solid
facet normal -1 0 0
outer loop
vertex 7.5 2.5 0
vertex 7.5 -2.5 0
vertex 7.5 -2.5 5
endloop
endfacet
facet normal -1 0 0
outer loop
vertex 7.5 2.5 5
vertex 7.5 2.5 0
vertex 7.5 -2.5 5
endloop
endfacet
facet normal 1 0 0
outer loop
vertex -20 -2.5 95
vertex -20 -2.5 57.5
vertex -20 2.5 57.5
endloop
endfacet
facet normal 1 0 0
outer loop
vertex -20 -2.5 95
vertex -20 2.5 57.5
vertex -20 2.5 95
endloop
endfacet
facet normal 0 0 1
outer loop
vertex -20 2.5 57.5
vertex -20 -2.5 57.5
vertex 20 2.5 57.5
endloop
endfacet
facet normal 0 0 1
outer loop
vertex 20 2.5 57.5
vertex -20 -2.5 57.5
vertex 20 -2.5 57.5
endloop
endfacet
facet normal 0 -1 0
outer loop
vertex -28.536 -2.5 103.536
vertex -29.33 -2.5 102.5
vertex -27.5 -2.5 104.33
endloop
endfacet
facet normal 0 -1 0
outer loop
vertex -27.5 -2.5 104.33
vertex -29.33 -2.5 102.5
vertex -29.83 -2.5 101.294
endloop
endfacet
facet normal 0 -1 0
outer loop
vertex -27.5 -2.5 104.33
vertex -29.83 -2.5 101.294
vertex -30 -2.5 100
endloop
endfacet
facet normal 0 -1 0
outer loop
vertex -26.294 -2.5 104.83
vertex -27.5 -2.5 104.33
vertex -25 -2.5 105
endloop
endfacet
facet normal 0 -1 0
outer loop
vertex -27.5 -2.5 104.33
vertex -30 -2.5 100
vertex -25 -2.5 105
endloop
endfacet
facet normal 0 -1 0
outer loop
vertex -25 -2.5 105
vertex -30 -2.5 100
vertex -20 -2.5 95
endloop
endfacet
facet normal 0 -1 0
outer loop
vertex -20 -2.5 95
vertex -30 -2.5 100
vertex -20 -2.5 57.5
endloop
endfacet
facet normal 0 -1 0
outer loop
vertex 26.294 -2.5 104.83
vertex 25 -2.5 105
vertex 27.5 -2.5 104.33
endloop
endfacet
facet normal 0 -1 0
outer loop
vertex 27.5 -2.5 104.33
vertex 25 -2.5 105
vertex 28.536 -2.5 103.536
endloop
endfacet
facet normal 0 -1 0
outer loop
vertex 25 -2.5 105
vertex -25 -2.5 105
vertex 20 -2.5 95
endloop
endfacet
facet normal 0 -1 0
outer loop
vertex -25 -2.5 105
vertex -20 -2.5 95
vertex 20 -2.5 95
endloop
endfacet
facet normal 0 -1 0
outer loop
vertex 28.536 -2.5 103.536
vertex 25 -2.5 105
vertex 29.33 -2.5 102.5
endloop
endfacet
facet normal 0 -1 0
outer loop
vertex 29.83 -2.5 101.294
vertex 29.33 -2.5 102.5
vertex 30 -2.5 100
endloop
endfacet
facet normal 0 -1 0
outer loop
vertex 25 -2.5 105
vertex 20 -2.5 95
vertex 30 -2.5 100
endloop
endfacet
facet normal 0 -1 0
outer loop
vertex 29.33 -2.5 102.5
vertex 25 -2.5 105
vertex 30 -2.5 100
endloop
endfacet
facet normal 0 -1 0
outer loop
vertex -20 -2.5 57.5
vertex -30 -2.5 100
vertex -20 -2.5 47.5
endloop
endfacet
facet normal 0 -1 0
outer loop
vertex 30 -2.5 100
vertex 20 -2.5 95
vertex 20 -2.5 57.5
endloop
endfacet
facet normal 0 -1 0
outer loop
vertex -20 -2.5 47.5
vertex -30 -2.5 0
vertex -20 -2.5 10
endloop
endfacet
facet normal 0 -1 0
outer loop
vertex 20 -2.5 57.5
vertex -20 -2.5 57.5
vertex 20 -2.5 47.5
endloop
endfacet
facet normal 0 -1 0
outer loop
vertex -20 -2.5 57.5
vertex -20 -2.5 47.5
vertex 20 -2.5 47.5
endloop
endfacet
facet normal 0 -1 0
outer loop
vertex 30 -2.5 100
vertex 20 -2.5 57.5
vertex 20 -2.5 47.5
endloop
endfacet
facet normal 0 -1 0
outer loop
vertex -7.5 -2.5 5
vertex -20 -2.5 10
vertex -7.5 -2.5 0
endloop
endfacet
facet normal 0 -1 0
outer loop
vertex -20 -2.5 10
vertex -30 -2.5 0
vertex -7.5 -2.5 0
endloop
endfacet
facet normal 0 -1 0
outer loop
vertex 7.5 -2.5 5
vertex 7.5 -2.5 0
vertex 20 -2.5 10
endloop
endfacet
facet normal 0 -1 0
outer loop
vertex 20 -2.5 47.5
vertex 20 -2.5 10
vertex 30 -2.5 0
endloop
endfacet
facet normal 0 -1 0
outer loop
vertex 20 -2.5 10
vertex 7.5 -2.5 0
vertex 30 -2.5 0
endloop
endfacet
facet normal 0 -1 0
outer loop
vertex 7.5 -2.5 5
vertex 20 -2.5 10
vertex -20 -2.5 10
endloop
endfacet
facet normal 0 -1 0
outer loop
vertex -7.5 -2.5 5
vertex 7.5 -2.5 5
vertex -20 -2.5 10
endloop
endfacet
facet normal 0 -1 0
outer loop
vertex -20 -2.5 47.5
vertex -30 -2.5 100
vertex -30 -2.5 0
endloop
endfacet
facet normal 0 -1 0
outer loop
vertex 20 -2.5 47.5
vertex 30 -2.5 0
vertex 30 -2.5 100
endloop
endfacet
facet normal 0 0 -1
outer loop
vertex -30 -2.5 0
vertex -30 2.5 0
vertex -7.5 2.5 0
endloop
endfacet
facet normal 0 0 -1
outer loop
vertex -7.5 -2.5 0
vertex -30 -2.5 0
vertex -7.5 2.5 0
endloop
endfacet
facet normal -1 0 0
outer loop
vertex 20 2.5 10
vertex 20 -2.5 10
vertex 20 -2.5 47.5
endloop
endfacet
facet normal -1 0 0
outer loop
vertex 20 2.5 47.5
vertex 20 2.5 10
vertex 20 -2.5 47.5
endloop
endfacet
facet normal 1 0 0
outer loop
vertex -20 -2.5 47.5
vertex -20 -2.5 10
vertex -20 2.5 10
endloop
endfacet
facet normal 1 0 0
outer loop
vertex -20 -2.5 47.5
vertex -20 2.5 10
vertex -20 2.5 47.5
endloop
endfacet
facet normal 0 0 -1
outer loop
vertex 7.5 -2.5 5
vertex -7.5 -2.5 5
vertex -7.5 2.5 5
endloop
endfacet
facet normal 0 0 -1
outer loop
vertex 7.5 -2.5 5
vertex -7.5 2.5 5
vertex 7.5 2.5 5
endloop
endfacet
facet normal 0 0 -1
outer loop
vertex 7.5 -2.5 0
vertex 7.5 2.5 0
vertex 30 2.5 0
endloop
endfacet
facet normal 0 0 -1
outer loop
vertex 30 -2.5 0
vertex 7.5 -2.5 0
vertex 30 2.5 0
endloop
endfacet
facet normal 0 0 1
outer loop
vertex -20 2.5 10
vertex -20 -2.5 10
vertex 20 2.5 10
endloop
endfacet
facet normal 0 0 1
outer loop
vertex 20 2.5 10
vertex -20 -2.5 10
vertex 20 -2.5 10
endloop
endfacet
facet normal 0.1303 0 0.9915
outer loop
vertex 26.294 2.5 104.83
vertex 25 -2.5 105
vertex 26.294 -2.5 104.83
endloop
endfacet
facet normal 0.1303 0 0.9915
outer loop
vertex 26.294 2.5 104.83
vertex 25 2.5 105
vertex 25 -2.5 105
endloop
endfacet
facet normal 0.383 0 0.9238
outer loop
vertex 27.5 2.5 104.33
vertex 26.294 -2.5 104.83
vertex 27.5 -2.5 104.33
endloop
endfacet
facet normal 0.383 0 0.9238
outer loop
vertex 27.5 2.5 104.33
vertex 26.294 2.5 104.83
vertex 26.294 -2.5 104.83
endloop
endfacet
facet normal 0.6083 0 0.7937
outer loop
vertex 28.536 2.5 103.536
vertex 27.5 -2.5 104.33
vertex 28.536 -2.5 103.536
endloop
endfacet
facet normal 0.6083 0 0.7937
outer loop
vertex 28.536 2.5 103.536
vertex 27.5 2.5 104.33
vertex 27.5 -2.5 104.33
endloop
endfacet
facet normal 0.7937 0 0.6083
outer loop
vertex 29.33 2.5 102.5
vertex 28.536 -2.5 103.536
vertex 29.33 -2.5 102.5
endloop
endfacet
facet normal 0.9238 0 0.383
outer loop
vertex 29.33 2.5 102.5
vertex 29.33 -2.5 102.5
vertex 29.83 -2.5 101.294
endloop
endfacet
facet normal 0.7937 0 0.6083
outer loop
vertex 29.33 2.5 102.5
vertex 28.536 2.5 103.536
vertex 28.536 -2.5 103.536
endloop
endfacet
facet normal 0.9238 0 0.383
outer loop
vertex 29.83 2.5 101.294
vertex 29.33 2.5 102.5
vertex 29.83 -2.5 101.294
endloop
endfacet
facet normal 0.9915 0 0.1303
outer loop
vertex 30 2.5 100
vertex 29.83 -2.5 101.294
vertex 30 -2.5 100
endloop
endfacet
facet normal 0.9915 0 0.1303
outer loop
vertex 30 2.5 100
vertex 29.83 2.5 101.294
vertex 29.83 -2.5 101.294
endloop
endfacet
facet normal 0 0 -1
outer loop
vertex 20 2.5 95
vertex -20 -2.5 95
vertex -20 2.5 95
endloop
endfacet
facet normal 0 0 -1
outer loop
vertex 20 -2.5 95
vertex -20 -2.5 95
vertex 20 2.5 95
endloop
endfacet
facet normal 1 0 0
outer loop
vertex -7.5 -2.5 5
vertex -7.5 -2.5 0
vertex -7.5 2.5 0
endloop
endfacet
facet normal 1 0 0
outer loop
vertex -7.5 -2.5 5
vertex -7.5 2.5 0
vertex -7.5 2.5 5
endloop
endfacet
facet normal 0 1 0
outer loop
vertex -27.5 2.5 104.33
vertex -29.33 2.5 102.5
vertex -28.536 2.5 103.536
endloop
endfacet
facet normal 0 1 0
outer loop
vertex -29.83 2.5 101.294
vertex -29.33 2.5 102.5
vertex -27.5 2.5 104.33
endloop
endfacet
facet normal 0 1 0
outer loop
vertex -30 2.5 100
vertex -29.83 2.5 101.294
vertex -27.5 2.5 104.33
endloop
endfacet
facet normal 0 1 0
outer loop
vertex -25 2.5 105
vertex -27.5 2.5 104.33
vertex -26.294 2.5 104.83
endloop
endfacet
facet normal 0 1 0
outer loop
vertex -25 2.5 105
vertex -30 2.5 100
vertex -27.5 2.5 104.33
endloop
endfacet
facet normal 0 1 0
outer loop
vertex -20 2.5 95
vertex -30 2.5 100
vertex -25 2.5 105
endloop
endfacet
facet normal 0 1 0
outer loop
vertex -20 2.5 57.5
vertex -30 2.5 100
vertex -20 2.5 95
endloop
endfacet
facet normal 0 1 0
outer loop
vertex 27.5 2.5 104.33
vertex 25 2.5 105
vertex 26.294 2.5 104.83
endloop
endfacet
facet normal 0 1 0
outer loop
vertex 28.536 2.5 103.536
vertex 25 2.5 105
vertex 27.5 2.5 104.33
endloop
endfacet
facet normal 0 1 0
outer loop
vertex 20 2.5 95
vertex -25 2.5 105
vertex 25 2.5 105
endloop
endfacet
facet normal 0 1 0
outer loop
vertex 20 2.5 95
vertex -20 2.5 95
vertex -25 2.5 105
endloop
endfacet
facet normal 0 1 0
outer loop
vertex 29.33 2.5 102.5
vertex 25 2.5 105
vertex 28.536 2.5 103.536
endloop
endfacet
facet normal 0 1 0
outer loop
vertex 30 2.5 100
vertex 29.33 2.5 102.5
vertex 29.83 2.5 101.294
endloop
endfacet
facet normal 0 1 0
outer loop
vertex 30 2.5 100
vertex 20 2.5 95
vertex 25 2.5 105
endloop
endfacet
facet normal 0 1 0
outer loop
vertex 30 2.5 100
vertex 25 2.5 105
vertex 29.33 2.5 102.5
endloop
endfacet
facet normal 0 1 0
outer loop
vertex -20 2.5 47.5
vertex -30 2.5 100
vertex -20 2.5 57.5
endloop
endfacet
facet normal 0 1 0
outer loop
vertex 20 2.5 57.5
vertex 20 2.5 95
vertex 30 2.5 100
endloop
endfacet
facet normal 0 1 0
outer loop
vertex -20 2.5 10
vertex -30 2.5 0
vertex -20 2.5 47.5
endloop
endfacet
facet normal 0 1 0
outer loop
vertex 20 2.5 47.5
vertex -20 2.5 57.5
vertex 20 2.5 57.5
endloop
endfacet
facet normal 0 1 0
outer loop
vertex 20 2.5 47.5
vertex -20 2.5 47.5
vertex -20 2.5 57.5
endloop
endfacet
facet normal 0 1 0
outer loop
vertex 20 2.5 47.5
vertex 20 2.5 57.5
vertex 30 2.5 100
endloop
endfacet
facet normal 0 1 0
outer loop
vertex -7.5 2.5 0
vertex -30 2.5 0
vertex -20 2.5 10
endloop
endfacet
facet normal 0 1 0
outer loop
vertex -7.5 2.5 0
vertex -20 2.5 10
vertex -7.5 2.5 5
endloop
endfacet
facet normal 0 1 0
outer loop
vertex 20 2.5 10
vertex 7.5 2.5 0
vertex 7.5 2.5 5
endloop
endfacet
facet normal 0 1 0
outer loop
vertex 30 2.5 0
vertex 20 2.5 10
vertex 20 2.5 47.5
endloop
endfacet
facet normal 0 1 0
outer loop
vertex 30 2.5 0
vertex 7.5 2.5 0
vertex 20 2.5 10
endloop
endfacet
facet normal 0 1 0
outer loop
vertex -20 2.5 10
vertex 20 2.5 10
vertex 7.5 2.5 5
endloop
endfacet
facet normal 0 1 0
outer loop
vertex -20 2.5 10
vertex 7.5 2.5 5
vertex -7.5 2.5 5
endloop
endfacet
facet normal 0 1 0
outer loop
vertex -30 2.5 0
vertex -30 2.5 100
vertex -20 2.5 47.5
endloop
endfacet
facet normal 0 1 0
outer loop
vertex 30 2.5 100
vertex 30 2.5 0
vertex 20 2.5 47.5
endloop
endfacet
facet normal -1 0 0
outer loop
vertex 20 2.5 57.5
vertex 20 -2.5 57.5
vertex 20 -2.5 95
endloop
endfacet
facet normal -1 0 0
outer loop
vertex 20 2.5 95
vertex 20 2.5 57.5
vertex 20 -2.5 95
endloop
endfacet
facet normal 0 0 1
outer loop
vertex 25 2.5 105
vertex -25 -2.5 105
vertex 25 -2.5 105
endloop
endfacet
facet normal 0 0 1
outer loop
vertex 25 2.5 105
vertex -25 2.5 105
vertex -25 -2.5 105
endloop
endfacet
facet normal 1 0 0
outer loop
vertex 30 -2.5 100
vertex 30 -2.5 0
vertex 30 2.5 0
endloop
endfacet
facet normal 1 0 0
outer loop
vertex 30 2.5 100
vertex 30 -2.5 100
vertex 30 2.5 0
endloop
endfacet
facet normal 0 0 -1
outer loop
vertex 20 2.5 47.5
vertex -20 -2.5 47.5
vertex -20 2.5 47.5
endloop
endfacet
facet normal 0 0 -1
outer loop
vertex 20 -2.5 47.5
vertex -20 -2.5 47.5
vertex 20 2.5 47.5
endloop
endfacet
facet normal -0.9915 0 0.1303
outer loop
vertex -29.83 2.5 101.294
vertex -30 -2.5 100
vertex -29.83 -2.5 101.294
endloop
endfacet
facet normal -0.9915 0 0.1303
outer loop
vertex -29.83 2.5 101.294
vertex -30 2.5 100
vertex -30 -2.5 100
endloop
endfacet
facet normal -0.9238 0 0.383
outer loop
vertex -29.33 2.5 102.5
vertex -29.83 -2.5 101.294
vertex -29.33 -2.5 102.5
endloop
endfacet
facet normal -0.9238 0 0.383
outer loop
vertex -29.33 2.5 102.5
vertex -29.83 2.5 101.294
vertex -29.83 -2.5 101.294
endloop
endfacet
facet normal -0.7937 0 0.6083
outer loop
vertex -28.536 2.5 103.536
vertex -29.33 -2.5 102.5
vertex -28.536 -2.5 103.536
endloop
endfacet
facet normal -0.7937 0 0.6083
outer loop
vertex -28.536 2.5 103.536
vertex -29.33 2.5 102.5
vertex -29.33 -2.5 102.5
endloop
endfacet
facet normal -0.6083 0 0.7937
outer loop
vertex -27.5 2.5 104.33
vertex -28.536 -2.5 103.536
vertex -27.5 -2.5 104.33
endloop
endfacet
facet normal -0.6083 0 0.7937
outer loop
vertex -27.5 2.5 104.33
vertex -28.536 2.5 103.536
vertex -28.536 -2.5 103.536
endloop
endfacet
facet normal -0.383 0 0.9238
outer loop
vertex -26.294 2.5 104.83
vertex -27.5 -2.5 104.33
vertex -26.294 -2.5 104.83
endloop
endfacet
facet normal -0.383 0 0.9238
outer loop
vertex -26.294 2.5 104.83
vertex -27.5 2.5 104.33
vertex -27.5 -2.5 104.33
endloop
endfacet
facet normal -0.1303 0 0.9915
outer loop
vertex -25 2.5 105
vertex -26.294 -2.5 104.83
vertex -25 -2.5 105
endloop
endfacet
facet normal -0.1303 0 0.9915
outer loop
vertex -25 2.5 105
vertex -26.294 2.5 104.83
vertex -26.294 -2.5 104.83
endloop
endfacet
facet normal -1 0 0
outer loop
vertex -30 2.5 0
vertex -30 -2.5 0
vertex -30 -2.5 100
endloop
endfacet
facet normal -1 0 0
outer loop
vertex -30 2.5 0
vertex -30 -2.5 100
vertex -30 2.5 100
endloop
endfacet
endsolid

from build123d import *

# Parameters (mm, degrees)
SKETCH1_W           = 60
SKETCH1_H           = 5
BOSS_EXTRUDE1_DEPTH = 105
SKETCH2_W           = 40
SKETCH2_H           = 37.5
CUT_EXTRUDE1_DEPTH  = 105
FILLET1_R           = 5
SKETCH4_W           = 15
SKETCH4_H           = 10
CUT_EXTRUDE3_DEPTH  = 10


with BuildPart() as part:
    # Sketch1 → Boss-Extrude1 (new body)
    with BuildSketch(Plane.XY):
        Rectangle(SKETCH1_W, SKETCH1_H)
    extrude(amount=BOSS_EXTRUDE1_DEPTH)

    # Sketch2 → Cut-Extrude1 (cut)
    with BuildSketch(Plane.XZ.offset(2.5)):
        with Locations((0, 28.75)):
            Rectangle(SKETCH2_W, SKETCH2_H)
        with Locations((0, 76.25)):
            Rectangle(SKETCH2_W, SKETCH2_H)
    extrude(amount=-CUT_EXTRUDE1_DEPTH, mode=Mode.SUBTRACT)

    # Fillet1
    fillet1_edges = [part.edges().sort_by_distance(p)[0] for p in [
        (-30, 0, 105),
        (30, 0, 105),
    ]]
    fillet(fillet1_edges, radius=FILLET1_R)

    # Sketch4 → Cut-Extrude3 (cut)
    with BuildSketch(Plane.XZ.offset(2.5)):
        Rectangle(SKETCH4_W, SKETCH4_H)
    extrude(amount=-CUT_EXTRUDE3_DEPTH, mode=Mode.SUBTRACT)


solid = part.part
